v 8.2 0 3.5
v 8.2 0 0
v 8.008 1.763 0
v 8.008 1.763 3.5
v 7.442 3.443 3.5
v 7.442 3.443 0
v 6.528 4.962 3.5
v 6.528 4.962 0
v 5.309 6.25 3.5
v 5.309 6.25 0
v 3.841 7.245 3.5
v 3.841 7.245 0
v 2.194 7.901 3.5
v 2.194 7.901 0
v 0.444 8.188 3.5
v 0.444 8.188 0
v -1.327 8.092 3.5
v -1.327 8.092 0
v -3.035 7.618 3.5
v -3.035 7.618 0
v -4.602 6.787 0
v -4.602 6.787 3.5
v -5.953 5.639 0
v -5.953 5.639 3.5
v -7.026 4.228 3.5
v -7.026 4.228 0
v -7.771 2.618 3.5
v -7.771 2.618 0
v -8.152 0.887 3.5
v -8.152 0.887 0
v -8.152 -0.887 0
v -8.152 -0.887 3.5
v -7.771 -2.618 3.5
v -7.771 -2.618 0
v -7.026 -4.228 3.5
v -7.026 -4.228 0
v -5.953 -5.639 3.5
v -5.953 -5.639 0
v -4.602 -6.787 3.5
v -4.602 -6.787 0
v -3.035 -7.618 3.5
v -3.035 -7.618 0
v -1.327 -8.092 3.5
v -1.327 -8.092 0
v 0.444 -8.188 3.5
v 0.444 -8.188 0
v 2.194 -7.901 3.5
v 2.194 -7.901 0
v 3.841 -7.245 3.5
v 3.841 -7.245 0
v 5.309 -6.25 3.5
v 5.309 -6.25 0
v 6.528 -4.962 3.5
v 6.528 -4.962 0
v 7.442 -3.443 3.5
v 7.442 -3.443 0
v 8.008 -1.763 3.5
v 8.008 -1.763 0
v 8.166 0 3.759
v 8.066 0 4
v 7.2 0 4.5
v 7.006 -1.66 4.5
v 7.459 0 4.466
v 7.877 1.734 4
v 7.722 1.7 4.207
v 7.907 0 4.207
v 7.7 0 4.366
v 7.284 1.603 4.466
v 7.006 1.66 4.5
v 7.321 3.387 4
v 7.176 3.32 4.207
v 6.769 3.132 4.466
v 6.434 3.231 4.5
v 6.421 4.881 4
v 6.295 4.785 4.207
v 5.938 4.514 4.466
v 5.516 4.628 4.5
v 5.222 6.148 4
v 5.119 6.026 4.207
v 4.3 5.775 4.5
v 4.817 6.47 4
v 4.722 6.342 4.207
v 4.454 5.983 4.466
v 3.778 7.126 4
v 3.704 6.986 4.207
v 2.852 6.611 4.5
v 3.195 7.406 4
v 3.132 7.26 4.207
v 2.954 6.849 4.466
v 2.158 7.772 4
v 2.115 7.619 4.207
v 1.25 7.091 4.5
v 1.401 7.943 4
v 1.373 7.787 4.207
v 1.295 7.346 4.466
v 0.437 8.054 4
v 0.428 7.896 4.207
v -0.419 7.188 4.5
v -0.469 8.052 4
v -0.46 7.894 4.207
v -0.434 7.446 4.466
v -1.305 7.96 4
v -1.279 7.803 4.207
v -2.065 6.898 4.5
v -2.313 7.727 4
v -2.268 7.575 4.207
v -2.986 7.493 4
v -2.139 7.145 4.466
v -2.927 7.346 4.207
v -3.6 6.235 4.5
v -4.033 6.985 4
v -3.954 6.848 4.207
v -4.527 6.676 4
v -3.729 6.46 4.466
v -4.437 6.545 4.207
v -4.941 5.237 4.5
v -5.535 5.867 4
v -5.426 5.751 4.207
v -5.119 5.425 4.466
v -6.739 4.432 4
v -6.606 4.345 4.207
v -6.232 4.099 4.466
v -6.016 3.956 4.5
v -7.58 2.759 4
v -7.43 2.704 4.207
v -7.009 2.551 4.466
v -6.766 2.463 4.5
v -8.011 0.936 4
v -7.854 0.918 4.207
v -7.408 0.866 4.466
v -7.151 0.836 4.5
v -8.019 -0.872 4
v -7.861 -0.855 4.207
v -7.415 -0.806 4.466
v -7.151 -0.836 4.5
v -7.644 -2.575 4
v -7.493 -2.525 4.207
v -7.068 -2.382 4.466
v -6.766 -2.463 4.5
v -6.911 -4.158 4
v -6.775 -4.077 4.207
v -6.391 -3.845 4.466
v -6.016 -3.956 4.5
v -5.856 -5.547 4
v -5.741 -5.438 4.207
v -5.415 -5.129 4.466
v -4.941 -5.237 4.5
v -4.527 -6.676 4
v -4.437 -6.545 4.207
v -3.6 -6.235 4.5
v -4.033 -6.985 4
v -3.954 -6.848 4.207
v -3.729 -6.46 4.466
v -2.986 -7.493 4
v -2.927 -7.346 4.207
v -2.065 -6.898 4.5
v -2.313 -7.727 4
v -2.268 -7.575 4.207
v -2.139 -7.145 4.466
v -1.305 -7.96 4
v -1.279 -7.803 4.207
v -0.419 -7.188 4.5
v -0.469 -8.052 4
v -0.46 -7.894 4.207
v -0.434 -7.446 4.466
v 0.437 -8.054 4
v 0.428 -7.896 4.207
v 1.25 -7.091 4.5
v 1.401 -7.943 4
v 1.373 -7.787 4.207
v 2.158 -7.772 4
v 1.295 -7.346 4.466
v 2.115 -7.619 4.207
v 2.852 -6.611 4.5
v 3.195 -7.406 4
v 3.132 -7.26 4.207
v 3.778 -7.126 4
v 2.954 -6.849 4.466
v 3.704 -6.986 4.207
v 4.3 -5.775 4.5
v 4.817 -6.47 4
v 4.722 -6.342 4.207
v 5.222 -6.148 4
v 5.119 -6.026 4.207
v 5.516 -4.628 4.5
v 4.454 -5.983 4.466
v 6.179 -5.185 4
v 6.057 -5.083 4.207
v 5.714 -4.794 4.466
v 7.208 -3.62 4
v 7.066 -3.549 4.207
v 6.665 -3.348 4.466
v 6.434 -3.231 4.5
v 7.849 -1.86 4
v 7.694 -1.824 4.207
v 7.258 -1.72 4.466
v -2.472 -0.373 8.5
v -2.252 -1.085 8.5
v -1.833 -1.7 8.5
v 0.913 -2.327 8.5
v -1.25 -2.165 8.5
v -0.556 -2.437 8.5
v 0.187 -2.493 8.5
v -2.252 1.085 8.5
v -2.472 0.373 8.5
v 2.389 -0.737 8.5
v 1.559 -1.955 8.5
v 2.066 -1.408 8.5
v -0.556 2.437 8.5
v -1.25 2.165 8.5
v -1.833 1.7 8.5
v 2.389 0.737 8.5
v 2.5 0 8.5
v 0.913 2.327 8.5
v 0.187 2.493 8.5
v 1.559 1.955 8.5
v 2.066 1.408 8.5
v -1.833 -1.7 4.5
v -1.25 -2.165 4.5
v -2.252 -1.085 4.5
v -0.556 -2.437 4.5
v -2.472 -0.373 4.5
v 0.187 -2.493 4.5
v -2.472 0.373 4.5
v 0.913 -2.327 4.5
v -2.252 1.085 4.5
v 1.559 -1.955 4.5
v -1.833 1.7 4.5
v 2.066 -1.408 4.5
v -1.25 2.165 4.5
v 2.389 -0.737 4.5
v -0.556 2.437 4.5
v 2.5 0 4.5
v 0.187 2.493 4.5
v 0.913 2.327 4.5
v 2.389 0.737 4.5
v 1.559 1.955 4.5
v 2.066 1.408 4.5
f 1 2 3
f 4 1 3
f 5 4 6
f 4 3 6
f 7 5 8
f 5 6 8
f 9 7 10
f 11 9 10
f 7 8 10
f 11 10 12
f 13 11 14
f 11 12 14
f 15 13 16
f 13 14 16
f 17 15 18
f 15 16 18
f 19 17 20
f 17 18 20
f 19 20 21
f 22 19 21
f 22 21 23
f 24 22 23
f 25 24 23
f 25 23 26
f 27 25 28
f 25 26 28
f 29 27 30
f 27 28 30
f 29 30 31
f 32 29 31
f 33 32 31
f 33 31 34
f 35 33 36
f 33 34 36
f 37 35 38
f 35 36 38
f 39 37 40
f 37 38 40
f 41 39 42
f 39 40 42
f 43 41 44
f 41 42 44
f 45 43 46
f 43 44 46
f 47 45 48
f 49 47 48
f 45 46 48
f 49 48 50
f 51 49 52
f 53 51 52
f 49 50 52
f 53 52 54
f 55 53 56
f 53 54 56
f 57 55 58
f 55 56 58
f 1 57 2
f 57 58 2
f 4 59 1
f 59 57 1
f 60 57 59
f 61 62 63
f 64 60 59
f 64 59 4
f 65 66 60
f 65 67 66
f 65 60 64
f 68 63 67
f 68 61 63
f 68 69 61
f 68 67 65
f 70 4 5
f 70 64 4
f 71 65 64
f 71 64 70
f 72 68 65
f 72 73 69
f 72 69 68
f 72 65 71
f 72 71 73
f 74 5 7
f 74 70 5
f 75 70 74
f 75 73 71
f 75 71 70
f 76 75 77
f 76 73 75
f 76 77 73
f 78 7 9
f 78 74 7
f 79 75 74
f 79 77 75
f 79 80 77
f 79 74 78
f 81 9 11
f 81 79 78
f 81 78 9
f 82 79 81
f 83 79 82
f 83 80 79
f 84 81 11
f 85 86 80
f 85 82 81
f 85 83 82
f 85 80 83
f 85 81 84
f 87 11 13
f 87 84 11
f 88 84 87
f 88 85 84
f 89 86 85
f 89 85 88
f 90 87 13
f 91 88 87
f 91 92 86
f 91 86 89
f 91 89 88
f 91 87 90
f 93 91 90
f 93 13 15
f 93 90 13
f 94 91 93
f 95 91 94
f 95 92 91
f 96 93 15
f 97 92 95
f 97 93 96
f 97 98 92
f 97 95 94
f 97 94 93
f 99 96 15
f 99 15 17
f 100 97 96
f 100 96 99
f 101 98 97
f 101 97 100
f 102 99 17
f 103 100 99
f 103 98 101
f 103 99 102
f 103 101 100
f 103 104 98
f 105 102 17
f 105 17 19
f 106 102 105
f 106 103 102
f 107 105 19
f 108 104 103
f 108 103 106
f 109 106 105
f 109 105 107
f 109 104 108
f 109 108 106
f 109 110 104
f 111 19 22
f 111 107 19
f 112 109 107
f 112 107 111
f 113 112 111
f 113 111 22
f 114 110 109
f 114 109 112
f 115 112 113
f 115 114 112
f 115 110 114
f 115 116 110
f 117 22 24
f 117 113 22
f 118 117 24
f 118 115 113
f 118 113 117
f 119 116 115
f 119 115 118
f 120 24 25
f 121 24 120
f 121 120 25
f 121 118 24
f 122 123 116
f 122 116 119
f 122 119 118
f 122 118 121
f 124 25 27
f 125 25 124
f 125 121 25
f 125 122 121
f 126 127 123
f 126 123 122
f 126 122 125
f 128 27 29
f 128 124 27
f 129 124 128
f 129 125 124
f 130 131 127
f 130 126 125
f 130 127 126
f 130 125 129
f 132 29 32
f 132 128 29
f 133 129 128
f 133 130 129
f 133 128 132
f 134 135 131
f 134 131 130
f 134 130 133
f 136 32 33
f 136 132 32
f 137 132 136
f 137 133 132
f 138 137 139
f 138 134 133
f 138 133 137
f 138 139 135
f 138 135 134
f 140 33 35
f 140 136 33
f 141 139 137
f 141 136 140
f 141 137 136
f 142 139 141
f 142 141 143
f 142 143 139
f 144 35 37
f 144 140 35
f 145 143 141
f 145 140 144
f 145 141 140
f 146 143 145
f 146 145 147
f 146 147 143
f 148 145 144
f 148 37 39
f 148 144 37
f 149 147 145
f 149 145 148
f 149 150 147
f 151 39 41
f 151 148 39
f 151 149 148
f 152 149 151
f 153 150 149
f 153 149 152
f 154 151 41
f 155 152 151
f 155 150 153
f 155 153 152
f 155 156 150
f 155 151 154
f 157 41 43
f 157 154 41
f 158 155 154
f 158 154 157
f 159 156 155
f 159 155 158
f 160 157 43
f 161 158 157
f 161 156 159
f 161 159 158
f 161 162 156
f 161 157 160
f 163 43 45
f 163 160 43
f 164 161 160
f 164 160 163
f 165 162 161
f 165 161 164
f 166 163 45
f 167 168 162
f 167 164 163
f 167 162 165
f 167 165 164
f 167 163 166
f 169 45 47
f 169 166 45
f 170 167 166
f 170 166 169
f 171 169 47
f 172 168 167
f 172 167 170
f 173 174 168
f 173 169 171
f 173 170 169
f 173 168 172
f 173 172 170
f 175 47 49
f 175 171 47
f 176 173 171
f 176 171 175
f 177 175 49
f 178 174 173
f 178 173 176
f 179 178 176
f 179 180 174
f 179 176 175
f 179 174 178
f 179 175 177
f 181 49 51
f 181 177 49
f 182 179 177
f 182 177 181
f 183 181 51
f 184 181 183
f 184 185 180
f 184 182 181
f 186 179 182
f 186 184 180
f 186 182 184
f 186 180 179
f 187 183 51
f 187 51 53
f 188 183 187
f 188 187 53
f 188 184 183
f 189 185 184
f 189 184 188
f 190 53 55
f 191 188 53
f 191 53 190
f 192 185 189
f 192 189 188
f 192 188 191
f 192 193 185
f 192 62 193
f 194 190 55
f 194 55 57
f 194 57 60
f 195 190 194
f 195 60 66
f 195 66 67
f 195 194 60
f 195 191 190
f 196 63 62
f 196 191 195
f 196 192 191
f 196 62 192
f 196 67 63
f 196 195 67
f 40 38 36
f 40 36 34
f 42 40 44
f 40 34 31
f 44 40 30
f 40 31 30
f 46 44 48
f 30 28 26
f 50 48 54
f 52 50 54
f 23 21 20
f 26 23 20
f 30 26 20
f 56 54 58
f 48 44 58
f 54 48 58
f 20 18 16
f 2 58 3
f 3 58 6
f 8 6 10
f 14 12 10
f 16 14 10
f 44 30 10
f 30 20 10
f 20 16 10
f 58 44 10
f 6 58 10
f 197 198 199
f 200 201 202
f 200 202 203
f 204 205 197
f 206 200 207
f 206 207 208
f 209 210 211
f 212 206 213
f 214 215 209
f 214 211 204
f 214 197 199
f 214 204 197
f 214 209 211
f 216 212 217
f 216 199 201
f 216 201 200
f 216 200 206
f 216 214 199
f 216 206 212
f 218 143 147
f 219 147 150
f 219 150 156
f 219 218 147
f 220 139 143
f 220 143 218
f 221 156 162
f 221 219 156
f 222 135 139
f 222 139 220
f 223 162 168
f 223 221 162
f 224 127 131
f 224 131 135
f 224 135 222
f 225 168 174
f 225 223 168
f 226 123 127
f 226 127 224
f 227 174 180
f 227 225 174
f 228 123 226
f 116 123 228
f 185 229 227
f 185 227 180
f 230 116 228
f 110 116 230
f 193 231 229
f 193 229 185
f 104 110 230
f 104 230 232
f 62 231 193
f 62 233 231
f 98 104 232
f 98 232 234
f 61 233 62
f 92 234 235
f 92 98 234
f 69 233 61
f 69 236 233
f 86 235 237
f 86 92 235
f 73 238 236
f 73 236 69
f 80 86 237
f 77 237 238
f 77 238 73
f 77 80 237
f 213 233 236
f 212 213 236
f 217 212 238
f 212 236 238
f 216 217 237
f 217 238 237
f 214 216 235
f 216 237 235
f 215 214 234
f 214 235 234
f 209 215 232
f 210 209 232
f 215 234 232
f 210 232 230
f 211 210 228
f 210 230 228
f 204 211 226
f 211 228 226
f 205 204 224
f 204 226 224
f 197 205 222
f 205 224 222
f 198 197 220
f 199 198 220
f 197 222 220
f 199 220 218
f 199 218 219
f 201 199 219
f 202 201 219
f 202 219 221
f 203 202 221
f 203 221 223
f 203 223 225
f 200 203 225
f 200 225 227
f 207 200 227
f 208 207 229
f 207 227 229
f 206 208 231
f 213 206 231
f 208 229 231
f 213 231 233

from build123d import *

# Parameters (mm, degrees)
SKETCH_R     = 8.2
PAD_DEPTH    = 4.5
SKETCH001_R  = 2.5
PAD001_DEPTH = 4
FILLET_R     = 1


with BuildPart() as part:
    # Sketch → Pad (new body)
    with BuildSketch(Plane.XY):
        Circle(SKETCH_R)
    extrude(amount=PAD_DEPTH)

    # Sketch001 (on Face3 of Pad) → Pad001 (join)
    with BuildSketch(Plane.XY.offset(4.5)):
        Circle(SKETCH001_R)
    extrude(amount=PAD001_DEPTH)

    # Fillet
    fillet_edges = [part.edges().sort_by_distance(p)[0] for p in [
        (-8.2, 0, 4.5),
    ]]
    fillet(fillet_edges, radius=FILLET_R)


solid = part.part
